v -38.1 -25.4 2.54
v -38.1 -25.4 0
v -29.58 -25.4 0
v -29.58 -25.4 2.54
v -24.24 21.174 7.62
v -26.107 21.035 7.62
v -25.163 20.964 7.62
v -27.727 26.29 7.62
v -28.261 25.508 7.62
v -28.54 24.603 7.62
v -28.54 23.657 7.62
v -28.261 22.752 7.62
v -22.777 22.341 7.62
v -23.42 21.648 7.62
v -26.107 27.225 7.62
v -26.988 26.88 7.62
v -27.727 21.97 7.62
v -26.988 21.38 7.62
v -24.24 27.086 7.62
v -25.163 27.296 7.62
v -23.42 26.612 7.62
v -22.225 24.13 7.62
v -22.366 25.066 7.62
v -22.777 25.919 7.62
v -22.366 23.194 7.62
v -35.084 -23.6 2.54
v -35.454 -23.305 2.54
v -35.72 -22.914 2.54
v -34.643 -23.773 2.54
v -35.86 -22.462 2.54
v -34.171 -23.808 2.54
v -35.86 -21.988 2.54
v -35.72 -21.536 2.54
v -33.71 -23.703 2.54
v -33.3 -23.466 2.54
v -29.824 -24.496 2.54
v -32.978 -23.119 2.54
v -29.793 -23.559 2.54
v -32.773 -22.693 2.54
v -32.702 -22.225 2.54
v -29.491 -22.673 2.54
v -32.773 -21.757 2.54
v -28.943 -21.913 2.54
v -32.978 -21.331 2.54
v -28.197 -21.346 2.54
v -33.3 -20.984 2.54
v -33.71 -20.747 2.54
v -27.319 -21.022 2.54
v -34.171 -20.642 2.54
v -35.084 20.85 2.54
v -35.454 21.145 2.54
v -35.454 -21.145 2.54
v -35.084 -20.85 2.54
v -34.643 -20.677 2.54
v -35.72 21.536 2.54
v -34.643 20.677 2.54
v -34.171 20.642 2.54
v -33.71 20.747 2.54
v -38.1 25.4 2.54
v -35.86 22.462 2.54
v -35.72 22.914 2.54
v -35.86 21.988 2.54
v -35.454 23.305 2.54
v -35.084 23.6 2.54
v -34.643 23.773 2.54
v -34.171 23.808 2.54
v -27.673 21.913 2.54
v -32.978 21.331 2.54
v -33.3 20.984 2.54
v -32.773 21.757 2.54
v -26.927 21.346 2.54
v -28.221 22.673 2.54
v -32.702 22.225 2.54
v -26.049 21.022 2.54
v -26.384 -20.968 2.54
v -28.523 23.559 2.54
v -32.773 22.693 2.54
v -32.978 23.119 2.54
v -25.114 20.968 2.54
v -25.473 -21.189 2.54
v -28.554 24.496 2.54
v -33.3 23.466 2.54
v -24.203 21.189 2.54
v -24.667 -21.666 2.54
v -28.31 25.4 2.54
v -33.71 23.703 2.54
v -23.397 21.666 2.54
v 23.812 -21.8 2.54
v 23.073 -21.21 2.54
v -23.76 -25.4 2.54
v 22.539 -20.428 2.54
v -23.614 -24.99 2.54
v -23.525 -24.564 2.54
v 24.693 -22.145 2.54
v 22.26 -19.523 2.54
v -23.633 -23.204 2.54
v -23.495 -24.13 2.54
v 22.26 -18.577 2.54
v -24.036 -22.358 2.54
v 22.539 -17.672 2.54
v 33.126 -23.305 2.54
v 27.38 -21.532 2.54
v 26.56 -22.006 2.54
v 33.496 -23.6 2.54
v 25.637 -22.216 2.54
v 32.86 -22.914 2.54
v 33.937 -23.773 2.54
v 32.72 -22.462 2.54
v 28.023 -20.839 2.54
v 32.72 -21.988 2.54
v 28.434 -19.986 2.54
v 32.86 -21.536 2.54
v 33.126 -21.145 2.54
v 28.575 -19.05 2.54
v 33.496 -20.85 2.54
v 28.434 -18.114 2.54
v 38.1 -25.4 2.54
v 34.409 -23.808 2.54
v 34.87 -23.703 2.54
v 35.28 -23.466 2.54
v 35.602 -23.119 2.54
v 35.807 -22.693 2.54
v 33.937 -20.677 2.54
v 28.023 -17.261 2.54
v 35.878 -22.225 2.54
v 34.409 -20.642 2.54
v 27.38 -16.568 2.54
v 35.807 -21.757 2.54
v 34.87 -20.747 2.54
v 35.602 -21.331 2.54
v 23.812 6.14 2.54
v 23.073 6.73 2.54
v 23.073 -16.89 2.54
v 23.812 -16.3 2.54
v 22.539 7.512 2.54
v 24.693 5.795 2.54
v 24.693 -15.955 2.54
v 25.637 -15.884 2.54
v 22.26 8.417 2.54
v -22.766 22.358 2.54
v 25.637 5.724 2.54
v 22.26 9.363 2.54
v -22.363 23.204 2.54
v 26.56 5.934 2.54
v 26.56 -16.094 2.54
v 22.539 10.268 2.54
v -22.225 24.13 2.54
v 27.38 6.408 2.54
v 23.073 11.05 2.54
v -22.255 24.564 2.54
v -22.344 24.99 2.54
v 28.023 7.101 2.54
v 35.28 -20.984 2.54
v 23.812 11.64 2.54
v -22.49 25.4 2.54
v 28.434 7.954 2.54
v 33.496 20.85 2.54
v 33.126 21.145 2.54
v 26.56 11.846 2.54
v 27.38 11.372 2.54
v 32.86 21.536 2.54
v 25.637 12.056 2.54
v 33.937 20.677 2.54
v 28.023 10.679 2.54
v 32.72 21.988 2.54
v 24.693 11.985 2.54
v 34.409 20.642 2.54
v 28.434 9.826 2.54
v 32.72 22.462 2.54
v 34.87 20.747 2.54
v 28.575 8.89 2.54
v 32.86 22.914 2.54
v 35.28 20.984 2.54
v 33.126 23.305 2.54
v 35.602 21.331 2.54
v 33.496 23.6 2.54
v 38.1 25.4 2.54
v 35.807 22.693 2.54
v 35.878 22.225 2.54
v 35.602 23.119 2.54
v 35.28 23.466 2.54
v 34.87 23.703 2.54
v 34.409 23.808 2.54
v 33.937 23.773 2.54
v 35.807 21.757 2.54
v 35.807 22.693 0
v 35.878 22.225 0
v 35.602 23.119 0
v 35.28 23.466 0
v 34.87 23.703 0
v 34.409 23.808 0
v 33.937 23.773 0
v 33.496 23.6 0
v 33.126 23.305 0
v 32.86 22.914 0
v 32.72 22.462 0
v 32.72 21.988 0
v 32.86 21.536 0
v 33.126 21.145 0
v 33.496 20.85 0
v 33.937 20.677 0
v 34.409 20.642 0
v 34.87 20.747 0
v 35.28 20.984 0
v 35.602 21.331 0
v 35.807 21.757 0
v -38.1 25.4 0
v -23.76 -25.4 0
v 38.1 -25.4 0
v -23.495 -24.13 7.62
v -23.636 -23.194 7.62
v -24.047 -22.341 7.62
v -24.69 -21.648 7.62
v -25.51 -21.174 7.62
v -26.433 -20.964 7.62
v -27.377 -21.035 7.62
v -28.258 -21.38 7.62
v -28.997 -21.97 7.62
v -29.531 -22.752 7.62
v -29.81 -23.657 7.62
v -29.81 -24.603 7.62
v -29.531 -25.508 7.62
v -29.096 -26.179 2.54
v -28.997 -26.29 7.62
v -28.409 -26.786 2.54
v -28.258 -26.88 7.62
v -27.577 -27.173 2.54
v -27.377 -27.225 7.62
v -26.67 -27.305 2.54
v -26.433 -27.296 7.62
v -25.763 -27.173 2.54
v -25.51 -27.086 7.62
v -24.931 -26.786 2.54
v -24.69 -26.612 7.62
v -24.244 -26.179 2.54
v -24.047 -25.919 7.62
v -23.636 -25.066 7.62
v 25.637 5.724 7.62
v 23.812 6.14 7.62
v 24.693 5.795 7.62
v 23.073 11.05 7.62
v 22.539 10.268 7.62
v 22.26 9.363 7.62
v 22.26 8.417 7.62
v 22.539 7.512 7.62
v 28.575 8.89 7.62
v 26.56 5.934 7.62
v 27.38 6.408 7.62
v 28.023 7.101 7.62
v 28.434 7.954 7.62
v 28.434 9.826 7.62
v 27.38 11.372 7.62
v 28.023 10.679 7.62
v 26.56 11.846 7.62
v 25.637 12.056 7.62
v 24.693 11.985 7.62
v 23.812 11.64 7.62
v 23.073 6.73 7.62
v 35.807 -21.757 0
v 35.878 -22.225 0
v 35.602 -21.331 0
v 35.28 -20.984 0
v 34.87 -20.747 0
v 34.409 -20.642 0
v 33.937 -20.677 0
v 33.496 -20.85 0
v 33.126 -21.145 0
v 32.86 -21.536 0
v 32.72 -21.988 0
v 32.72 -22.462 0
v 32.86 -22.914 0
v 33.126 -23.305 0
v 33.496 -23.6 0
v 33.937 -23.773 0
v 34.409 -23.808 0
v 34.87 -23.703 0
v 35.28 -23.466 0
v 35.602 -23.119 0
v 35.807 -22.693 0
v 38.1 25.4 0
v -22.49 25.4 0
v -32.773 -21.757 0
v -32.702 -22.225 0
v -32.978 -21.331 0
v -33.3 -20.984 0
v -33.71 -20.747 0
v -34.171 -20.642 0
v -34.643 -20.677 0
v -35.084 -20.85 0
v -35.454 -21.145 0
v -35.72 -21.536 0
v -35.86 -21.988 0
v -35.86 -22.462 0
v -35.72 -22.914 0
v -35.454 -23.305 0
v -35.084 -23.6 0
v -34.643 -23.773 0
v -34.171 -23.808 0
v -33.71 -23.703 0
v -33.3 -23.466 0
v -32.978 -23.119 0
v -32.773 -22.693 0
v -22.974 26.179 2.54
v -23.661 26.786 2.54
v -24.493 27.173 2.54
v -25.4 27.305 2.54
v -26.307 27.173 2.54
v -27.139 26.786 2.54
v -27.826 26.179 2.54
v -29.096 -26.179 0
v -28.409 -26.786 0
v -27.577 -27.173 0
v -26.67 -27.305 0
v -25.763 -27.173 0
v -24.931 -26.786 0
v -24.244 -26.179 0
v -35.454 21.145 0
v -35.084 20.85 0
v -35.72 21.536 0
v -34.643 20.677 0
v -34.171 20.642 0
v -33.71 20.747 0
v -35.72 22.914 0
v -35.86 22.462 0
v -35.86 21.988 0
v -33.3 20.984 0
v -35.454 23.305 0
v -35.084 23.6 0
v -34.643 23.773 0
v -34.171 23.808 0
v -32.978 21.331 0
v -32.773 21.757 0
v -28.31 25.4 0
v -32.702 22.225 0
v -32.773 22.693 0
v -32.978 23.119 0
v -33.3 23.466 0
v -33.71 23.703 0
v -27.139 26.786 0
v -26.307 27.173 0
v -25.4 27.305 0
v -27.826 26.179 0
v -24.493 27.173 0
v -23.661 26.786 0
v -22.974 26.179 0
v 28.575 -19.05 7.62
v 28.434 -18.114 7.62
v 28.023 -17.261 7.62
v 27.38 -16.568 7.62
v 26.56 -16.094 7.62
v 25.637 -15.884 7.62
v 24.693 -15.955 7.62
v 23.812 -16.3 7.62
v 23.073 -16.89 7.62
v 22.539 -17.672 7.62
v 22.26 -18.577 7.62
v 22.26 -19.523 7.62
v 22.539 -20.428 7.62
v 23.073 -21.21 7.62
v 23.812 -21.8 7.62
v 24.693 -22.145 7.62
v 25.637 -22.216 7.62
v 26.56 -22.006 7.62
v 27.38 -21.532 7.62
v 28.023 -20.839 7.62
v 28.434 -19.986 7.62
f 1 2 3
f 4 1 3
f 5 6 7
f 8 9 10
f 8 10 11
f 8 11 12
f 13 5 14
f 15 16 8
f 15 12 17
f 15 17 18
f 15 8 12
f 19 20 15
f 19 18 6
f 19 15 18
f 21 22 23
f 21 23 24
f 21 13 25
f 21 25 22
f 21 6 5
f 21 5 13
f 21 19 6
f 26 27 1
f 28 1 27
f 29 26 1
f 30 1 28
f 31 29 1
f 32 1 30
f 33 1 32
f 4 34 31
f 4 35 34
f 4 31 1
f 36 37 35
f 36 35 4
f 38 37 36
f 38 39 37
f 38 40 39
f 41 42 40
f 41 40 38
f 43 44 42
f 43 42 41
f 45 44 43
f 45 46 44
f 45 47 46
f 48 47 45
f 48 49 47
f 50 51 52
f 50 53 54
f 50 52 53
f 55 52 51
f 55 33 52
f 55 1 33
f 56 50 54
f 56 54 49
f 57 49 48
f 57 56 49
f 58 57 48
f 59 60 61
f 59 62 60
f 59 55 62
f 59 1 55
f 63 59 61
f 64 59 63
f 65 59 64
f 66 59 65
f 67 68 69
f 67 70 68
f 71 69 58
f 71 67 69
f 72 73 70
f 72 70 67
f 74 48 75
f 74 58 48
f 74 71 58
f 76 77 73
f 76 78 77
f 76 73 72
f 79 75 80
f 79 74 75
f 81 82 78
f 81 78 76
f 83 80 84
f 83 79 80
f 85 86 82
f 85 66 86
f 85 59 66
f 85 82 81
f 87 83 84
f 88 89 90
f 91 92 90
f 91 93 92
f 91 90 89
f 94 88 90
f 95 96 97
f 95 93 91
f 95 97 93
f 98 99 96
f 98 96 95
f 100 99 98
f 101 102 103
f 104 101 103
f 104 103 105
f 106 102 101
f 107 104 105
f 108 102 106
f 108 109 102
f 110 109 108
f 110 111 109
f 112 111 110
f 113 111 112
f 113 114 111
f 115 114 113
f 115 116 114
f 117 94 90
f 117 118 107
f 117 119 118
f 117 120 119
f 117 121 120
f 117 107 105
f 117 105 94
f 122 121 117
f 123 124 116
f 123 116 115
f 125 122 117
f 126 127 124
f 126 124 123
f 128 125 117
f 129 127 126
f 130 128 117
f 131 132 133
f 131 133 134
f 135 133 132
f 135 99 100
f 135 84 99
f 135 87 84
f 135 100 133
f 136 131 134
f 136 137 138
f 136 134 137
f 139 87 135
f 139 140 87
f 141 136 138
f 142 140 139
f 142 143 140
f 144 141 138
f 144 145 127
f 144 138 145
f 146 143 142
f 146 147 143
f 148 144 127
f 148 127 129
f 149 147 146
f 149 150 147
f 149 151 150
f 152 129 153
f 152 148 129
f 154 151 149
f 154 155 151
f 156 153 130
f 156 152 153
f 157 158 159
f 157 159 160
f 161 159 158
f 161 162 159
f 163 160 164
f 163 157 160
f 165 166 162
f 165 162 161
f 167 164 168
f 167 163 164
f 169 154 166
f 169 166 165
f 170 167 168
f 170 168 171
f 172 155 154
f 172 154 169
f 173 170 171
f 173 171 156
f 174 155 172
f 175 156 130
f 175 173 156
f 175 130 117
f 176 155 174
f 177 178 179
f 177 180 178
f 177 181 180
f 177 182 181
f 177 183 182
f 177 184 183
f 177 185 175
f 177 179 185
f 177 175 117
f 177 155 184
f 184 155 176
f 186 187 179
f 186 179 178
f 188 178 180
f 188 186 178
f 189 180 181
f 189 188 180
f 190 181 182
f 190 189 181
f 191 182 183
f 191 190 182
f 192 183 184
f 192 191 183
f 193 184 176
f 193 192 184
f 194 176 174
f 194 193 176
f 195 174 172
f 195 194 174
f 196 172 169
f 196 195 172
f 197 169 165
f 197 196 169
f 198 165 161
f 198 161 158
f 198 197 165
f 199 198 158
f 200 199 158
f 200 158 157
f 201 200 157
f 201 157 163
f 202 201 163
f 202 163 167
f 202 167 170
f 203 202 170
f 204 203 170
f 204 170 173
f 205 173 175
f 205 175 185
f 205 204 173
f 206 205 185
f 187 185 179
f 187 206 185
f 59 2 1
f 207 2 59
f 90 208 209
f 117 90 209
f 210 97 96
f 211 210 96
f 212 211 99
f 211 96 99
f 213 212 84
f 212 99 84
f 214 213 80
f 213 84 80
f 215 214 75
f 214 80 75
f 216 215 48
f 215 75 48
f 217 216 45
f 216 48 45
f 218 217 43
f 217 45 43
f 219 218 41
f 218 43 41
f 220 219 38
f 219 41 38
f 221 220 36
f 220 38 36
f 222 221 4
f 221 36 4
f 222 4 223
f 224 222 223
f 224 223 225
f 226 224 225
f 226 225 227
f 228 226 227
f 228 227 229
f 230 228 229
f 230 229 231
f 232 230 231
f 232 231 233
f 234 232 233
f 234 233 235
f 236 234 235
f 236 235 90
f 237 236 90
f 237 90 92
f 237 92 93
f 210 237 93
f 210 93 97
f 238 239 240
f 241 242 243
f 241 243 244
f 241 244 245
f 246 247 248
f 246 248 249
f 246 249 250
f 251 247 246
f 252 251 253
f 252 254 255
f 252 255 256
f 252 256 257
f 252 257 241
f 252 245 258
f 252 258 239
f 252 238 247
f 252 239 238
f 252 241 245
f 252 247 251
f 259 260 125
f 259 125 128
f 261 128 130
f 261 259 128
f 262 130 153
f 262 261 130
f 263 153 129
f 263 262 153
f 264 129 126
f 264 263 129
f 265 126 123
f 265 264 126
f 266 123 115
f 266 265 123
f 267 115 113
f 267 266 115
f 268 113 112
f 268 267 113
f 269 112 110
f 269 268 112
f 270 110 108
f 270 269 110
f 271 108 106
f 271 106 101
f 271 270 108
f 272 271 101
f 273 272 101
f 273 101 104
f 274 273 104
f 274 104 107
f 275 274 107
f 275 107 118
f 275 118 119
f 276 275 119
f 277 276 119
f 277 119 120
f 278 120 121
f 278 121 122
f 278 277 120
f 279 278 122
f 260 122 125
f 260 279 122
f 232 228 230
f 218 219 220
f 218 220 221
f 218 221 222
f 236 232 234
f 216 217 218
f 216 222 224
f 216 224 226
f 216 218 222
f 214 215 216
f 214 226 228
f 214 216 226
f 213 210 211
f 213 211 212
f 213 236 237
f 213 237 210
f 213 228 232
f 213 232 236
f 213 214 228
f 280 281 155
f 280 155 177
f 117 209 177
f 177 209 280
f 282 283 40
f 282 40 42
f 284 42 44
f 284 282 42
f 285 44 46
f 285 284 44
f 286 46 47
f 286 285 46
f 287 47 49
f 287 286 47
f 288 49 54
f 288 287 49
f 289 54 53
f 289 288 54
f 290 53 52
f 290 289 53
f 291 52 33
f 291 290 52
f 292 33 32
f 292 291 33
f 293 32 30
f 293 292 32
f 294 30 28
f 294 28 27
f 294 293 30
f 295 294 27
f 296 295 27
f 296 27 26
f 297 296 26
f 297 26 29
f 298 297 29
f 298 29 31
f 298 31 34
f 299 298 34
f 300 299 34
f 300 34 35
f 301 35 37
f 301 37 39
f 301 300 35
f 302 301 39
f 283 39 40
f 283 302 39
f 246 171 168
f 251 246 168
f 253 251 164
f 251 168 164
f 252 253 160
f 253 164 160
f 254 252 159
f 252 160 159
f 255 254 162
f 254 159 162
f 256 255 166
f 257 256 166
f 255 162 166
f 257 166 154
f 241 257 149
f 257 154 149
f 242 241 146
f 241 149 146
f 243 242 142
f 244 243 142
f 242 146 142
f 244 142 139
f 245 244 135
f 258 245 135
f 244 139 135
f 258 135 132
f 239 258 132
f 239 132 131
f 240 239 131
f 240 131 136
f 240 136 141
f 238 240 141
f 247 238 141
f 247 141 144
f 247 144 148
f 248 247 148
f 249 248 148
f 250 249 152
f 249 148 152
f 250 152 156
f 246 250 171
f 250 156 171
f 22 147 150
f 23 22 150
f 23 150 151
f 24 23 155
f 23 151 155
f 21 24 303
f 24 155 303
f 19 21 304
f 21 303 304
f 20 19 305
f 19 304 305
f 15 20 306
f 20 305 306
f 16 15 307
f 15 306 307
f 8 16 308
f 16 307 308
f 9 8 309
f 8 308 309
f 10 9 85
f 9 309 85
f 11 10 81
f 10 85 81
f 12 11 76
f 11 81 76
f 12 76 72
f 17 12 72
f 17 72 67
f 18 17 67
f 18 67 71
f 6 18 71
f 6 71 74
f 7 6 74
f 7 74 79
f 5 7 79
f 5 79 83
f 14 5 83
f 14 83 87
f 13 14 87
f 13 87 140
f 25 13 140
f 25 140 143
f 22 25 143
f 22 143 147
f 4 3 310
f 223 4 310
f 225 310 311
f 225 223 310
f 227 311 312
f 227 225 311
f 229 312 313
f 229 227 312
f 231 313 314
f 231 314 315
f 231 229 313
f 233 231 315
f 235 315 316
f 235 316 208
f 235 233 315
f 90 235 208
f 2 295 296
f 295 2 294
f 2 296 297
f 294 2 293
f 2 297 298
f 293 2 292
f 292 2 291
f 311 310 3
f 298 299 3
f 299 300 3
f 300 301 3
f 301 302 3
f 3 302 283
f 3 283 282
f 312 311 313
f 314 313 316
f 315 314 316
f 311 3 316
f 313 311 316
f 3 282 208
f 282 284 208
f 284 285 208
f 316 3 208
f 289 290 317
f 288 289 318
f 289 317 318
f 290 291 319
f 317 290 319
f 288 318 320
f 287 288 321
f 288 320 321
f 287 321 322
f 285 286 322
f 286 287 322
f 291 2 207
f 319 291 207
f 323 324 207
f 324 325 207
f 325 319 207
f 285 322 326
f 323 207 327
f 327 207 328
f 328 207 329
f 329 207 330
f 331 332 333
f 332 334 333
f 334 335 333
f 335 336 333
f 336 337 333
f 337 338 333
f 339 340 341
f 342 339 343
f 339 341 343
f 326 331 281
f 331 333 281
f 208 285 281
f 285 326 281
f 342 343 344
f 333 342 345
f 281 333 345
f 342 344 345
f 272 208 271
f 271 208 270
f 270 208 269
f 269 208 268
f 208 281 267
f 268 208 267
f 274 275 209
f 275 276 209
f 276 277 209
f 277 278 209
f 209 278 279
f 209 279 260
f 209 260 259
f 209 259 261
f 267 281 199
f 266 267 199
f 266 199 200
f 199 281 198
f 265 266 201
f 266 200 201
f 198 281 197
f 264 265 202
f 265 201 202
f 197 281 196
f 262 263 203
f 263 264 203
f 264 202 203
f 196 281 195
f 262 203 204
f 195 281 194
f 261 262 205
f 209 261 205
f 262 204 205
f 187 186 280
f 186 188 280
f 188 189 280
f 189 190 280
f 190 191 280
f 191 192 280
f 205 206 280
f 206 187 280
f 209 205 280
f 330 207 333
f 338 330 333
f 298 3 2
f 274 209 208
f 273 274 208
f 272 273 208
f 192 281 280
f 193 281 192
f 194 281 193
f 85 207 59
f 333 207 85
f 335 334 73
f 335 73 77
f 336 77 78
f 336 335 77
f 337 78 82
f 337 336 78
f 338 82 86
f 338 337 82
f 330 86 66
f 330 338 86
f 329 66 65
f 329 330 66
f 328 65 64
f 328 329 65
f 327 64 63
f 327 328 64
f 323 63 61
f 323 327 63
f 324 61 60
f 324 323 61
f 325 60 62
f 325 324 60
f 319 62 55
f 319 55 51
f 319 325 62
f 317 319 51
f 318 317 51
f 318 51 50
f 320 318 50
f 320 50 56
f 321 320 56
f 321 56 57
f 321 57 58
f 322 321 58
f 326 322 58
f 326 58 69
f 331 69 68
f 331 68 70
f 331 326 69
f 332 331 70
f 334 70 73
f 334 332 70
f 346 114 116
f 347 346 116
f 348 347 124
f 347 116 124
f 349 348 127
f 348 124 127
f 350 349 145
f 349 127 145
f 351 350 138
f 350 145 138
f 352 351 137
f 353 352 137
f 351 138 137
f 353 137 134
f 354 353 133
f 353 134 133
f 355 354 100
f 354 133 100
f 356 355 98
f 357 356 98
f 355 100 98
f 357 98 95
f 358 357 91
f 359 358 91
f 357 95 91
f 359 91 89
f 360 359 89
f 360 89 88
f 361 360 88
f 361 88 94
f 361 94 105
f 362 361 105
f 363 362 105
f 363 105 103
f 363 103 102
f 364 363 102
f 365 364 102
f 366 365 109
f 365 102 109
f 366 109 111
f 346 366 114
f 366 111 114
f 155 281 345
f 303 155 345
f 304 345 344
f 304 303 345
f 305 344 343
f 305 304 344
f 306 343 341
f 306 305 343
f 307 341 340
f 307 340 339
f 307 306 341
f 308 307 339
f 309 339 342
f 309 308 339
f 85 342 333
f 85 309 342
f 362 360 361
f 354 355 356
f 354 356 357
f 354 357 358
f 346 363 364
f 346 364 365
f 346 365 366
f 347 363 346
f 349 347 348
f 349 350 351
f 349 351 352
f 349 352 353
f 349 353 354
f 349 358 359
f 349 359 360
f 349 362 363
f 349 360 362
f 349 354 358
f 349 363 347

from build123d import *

# Parameters (mm, degrees)
SKETCH1_W                = 76.2
SKETCH1_H                = 50.8
SKETCH1_R                = 1.5875
BOSS_EXTRUDE1_DEPTH      = 2.54
SKETCH2_R                = 3.175
BOSS_EXTRUDE2_DEPTH      = 5.08
BOSS_EXTRUDE2_DEPTH_BACK = 2.54


with BuildPart() as part:
    # Sketch1 → Boss-Extrude1 (new body)
    with BuildSketch(Plane.XY):
        Rectangle(SKETCH1_W, SKETCH1_H)
        with Locations((-34.29, 22.225)):
            Circle(SKETCH1_R, mode=Mode.SUBTRACT)
        with Locations((34.29, 22.225)):
            Circle(SKETCH1_R, mode=Mode.SUBTRACT)
        with Locations((34.29, -22.225)):
            Circle(SKETCH1_R, mode=Mode.SUBTRACT)
        with Locations((-34.29, -22.225)):
            Circle(SKETCH1_R, mode=Mode.SUBTRACT)
    extrude(amount=BOSS_EXTRUDE1_DEPTH)

    # Sketch2 → Boss-Extrude2 (add, two sides)
    with BuildSketch(Plane.XY.offset(2.54)) as boss_extrude2_sk:
        with Locations((-25.4, 24.13)):
            Circle(SKETCH2_R)
        with Locations((-26.67, -24.13)):
            Circle(SKETCH2_R)
        with Locations((25.4, 8.89)):
            Circle(SKETCH2_R)
        with Locations((25.4, -19.05)):
            Circle(SKETCH2_R)
    extrude(amount=BOSS_EXTRUDE2_DEPTH)
    extrude(boss_extrude2_sk.sketch, amount=-BOSS_EXTRUDE2_DEPTH_BACK)


solid = part.part
